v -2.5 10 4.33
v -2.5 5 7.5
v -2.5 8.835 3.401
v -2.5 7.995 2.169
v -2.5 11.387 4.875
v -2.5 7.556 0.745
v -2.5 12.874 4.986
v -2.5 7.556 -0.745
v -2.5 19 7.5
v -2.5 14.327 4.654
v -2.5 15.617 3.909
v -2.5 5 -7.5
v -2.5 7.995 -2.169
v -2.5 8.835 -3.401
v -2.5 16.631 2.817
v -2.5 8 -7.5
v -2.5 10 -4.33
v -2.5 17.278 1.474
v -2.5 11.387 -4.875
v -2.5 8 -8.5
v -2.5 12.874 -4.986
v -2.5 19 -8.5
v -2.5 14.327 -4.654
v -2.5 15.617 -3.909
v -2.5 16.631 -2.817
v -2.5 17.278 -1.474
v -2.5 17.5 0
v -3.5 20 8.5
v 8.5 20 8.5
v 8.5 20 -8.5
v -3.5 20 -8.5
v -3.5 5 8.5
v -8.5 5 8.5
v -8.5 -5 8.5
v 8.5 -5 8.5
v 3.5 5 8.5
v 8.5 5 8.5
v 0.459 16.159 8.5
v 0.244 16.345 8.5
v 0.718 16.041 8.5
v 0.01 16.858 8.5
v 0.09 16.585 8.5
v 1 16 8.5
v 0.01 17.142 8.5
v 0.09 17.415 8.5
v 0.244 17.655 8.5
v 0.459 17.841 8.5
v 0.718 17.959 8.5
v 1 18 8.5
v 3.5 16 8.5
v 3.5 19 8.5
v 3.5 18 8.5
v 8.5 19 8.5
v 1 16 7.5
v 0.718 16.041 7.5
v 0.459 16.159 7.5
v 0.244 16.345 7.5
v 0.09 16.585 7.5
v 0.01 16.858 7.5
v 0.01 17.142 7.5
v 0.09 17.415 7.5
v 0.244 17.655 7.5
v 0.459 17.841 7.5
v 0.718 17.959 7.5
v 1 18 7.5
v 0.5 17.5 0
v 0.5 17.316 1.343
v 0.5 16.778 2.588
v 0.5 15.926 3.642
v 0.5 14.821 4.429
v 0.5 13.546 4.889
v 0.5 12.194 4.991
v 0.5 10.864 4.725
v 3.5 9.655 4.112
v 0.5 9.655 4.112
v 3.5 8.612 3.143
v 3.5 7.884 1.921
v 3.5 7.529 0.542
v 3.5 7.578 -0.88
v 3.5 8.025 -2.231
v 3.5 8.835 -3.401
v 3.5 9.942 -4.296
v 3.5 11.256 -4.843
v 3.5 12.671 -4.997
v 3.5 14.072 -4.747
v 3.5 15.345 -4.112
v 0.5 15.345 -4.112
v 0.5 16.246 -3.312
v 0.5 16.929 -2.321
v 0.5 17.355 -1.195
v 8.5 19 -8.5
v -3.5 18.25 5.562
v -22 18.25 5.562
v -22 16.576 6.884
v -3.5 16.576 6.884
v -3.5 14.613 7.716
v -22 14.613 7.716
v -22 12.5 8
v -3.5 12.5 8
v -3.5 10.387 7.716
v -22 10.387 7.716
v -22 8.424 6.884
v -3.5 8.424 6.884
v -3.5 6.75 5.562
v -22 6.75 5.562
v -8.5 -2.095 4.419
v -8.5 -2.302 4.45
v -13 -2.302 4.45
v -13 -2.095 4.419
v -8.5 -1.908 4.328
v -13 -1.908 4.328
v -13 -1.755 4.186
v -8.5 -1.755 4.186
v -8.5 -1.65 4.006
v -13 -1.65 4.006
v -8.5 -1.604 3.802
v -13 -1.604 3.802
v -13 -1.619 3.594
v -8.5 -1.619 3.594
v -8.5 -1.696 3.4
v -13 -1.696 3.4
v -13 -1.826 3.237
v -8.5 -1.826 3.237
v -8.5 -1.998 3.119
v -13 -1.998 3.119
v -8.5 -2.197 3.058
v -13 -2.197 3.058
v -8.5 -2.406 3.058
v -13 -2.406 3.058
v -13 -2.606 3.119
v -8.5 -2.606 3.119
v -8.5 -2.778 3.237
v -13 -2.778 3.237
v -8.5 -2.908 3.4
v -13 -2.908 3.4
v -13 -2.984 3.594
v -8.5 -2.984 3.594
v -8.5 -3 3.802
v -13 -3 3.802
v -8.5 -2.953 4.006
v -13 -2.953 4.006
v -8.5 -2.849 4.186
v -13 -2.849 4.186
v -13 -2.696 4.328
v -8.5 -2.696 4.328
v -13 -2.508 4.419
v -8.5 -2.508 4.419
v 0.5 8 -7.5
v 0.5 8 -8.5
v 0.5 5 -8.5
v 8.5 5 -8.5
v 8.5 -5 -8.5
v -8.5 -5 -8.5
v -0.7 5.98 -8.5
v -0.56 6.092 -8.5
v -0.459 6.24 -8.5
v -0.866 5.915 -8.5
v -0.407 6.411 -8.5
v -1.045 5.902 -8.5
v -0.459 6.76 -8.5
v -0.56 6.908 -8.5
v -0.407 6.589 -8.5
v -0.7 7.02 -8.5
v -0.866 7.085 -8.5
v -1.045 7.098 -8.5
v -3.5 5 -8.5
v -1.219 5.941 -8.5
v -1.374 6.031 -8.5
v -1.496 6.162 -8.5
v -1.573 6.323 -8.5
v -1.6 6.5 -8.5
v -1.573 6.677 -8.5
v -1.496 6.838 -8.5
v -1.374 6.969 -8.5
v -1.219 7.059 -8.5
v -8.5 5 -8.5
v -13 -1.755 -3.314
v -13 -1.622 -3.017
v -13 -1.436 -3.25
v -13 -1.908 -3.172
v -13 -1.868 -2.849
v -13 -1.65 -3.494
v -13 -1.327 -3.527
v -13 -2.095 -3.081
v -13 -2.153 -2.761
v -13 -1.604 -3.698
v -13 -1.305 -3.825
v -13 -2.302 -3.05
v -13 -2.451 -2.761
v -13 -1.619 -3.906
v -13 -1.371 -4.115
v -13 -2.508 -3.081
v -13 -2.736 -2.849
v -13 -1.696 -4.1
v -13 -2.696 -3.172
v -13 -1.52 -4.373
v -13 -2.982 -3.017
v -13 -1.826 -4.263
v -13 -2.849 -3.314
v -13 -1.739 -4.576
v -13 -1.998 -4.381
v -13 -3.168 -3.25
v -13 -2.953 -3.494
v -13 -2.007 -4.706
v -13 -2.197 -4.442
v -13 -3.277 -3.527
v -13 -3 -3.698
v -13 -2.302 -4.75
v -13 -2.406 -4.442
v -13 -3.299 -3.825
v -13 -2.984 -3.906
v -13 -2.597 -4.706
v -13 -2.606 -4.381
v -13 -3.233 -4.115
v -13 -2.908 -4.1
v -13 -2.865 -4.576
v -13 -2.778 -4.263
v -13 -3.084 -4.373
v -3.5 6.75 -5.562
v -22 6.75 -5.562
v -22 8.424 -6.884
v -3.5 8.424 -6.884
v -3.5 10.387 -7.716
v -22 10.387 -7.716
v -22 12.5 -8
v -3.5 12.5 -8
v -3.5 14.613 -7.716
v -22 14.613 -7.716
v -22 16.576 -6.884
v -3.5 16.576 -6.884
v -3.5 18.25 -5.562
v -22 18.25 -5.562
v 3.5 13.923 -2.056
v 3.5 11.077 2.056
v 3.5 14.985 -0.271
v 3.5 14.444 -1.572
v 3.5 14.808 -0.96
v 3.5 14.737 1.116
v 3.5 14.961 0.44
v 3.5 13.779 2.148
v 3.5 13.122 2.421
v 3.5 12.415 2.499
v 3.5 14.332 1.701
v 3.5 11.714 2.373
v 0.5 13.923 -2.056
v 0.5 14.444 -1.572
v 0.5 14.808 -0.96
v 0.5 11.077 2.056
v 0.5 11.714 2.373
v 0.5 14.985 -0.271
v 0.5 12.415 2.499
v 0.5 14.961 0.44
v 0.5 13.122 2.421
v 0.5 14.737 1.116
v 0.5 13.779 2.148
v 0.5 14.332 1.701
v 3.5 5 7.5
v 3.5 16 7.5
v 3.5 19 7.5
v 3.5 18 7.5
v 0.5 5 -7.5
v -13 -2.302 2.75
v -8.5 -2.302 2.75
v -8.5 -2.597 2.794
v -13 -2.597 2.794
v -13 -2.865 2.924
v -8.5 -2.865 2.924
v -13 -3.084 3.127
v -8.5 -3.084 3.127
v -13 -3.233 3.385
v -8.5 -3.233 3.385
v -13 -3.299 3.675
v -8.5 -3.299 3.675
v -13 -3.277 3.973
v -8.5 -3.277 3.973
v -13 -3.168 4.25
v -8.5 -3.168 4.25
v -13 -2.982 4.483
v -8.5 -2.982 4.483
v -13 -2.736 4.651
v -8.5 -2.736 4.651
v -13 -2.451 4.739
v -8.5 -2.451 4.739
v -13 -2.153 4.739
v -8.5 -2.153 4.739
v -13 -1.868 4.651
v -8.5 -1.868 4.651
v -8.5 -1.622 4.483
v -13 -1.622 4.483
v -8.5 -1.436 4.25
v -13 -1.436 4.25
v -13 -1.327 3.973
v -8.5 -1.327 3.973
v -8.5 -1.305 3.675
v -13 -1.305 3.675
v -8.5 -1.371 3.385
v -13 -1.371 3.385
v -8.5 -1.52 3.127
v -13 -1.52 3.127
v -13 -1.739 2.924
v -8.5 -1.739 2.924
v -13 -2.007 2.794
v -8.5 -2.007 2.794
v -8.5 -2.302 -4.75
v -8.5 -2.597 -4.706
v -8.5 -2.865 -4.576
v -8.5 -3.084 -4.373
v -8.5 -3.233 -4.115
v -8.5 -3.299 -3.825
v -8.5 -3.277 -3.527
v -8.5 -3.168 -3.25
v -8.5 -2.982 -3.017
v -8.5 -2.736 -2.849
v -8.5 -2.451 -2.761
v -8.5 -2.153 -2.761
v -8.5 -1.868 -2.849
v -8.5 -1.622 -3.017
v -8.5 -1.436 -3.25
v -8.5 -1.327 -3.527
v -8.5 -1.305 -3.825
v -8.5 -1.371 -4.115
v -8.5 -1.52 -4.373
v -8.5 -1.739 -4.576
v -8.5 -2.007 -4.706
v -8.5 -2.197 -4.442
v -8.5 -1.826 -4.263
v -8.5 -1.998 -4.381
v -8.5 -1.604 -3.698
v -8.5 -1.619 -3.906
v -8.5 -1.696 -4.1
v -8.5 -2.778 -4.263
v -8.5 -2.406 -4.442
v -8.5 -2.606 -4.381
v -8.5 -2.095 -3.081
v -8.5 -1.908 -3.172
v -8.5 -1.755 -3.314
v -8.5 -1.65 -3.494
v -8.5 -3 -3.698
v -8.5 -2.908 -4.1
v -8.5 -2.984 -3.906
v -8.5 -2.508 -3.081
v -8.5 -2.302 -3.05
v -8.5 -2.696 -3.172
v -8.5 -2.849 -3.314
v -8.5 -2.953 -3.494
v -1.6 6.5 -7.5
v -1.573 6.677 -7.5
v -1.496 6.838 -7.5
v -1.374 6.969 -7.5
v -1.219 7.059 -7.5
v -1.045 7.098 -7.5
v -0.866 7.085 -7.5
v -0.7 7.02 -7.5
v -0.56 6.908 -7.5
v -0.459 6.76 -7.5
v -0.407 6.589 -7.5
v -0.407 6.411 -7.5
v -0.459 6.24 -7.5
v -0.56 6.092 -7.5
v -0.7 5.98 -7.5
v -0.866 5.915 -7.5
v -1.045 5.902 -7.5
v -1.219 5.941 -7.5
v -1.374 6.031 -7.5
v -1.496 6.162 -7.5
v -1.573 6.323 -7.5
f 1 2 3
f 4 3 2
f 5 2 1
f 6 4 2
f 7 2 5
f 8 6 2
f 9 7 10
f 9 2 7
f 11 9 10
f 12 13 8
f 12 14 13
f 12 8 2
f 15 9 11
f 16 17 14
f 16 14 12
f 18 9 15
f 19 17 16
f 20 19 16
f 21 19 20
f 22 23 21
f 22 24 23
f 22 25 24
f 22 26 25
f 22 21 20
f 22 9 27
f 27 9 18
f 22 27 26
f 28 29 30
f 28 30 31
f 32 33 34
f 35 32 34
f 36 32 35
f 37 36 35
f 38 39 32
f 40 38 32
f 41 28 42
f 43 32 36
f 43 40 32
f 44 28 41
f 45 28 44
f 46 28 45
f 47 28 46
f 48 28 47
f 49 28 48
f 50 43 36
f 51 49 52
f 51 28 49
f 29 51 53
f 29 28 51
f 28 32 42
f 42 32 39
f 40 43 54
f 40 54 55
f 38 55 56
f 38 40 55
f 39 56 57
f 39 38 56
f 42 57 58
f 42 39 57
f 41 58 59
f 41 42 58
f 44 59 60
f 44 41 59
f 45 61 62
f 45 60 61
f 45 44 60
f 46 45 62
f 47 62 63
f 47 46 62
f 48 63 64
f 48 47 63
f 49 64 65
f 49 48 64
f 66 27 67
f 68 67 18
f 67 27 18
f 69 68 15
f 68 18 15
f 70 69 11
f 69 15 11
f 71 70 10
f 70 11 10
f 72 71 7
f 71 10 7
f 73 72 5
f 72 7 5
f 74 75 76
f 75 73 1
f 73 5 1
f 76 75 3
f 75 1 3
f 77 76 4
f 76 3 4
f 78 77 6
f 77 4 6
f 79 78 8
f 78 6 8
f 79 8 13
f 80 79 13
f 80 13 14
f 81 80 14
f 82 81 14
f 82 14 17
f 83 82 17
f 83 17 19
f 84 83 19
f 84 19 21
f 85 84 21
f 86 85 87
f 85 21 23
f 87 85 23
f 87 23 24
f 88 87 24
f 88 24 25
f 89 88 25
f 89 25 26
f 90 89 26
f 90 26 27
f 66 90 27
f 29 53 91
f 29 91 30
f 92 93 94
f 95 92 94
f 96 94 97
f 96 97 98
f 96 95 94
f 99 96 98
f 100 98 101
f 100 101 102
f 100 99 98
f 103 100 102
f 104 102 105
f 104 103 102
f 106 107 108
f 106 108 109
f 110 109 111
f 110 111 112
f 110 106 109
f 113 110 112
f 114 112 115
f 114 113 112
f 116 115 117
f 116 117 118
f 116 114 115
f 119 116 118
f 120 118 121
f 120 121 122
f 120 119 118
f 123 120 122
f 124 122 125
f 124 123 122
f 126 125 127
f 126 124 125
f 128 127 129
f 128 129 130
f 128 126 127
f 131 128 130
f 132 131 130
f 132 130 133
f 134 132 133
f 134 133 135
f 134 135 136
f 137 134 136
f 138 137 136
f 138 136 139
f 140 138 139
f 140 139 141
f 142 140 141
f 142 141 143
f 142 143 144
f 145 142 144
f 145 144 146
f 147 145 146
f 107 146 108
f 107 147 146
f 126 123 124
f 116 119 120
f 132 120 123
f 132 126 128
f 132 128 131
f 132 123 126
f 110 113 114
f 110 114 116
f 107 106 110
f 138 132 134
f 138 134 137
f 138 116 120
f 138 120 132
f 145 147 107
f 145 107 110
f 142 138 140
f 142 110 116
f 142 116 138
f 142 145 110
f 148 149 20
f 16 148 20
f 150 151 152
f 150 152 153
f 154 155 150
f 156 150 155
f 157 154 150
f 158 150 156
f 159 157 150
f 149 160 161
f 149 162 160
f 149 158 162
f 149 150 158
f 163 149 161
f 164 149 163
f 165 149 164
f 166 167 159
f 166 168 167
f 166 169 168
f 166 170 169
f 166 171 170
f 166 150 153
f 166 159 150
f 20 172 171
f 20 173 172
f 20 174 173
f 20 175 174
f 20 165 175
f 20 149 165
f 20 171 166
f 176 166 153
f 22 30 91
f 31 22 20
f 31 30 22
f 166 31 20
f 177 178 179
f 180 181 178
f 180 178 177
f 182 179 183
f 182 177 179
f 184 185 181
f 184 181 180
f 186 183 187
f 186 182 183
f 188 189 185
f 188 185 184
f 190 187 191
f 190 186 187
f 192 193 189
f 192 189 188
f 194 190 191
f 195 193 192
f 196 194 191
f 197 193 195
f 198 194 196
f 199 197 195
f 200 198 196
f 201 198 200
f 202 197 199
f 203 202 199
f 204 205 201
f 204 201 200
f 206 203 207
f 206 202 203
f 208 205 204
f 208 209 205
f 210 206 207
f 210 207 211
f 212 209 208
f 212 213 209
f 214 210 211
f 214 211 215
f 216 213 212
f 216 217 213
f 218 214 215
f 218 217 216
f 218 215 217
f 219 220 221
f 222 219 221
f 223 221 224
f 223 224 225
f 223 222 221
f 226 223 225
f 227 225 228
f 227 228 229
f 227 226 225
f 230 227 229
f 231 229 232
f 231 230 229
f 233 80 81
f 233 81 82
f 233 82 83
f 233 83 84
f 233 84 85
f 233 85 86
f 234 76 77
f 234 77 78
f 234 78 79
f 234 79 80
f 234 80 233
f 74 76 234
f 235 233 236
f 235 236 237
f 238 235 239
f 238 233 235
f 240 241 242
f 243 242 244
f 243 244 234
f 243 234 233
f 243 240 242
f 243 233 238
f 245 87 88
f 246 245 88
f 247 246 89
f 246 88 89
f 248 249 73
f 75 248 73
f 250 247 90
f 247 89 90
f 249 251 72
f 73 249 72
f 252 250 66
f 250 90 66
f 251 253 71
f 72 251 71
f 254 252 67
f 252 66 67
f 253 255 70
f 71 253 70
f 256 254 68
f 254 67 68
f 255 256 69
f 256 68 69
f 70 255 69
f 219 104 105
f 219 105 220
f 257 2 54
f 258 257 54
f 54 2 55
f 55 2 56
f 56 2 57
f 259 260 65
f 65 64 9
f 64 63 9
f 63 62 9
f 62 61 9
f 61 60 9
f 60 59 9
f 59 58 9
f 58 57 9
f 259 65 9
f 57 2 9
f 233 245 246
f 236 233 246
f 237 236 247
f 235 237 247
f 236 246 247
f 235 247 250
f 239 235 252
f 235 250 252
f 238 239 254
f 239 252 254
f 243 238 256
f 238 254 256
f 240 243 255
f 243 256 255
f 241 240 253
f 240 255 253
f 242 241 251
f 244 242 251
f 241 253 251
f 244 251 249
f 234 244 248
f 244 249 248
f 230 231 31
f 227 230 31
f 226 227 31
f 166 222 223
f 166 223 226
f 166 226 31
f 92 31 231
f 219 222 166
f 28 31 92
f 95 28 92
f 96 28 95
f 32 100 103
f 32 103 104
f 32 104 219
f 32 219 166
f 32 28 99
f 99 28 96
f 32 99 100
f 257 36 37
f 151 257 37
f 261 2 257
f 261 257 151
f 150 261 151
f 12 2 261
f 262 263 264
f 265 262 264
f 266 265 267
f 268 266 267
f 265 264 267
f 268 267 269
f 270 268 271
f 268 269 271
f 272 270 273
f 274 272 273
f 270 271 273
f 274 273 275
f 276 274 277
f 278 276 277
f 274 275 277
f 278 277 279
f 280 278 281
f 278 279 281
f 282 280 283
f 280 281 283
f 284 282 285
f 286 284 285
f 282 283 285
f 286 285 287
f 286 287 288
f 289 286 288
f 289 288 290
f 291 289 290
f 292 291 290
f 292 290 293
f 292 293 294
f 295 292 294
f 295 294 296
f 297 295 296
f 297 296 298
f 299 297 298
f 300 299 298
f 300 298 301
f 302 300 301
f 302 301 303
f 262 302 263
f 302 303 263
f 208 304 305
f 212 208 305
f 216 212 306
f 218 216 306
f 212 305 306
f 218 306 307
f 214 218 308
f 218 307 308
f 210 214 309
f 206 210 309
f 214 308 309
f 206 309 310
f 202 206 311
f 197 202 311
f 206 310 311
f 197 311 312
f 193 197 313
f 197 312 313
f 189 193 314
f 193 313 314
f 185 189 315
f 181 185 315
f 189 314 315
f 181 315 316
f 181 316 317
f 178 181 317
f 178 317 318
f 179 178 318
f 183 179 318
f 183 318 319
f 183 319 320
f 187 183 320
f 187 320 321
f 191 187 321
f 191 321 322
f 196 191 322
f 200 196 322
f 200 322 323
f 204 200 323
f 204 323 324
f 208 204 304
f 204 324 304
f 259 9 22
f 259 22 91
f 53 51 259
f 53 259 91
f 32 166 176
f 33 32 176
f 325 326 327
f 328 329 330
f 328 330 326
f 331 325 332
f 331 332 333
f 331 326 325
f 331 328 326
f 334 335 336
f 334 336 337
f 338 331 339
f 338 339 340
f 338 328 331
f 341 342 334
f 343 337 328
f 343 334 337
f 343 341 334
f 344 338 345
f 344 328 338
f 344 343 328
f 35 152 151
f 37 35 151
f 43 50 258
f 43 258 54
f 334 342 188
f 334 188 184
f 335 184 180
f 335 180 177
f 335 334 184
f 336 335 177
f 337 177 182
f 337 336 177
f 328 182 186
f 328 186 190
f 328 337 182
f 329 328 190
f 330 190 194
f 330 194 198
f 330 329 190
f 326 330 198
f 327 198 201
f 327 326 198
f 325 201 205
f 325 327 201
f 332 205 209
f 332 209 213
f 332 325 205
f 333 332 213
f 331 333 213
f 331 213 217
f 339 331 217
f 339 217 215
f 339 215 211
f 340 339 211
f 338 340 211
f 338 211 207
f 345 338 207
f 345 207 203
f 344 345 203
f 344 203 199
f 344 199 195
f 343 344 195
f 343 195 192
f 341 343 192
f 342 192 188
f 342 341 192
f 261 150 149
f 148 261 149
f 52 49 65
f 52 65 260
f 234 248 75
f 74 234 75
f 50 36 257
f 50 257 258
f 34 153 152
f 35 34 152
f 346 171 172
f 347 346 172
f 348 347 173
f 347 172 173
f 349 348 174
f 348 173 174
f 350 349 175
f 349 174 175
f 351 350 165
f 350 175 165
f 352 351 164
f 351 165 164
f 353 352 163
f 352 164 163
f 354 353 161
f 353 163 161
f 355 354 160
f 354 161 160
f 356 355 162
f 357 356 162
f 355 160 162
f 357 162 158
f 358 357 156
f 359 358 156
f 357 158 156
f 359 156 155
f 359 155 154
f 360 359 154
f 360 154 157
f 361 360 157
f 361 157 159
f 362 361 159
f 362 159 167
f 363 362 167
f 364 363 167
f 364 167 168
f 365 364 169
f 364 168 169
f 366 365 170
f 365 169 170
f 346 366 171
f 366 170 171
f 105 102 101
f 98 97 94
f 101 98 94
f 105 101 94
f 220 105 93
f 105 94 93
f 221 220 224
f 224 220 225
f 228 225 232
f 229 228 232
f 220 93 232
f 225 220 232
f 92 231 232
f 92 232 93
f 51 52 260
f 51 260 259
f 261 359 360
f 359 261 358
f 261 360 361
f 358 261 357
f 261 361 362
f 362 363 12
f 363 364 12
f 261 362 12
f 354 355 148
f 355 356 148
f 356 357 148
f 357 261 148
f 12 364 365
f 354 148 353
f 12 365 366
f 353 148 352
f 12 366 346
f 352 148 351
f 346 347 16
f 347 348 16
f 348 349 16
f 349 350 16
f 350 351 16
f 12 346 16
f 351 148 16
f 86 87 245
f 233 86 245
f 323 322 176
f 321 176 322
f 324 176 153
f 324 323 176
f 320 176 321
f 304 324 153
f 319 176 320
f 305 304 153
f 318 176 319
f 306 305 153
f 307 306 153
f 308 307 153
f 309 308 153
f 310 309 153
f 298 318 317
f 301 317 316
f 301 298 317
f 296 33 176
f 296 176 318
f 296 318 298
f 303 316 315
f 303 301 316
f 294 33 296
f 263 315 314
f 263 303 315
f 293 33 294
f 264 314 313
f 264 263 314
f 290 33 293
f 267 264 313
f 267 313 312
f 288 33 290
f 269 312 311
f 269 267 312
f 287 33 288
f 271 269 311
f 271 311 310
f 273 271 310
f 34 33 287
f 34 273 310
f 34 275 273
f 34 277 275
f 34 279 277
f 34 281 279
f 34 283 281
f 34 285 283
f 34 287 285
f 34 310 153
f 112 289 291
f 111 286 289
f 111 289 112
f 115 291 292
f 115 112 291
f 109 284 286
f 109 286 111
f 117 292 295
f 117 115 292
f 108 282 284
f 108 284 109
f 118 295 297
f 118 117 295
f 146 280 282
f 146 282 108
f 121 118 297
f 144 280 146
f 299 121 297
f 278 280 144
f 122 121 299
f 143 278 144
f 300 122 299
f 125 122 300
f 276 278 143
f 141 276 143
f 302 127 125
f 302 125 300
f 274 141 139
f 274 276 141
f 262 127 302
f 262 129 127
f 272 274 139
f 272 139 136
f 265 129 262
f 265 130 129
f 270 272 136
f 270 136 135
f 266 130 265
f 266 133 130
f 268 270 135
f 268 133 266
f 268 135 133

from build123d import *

# Parameters (mm, degrees)
BOSS_EXTRUDE1_DEPTH     = 8.5
CUT_EXTRUDE1_DEPTH      = 24.334523779
CUT_EXTRUDE1_DEPTH_BACK = 2.5
SKETCH2_W               = 16
SKETCH2_H               = 14
SKETCH3_W               = 3
SKETCH3_H               = 3
SKETCH3_R               = 0.6
BOSS_EXTRUDE2_DEPTH     = 1
BOSS_EXTRUDE3_DEPTH     = 18.5
SKETCH5_R               = 5
BOSS_EXTRUDE4_DEPTH     = 6
CUT_EXTRUDE2_START      = -3
CUT_EXTRUDE2_DEPTH      = 3
SKETCH7_R               = 1
SKETCH7_R_2             = 0.7
BOSS_EXTRUDE5_DEPTH     = 4.5


with BuildPart() as part:
    # Sketch1 → Boss-Extrude1 (new, symmetric)
    with BuildSketch(Plane.XY):
        with BuildLine():
            Line((-8.5, 5), (-8.5, -5))
            Line((-8.5, -5), (8.5, -5))
            Line((8.5, -5), (8.5, 5))
            Line((8.5, 5), (3.5, 5))
            Line((3.5, 5), (3.5, 16))
            Line((3.5, 16), (1, 16))
            ThreePointArc((1, 16), (0, 17), (1, 18))
            Line((1, 18), (3.5, 18))
            Line((3.5, 18), (3.5, 19))
            Line((3.5, 19), (8.5, 19))
            Line((8.5, 19), (8.5, 20))
            Line((8.5, 20), (-3.5, 20))
            Line((-3.5, 20), (-3.5, 5))
            Line((-3.5, 5), (-8.5, 5))
        make_face()
    extrude(amount=BOSS_EXTRUDE1_DEPTH, both=True)

    # Sketch2 → Cut-Extrude1 (cut, two sides: drawn at the far end of the back side and taken through both)
    with BuildSketch(Plane(origin=(0, 0, 0), x_dir=(0, 0, -1), z_dir=(1, 0, 0)).offset(-CUT_EXTRUDE1_DEPTH_BACK)):
        with Locations((0.5, 12)):
            Rectangle(SKETCH2_W, SKETCH2_H)
    extrude(amount=CUT_EXTRUDE1_DEPTH + CUT_EXTRUDE1_DEPTH_BACK, mode=Mode.SUBTRACT)

    # Sketch3 → Boss-Extrude2 (add)
    with BuildSketch(Plane(origin=(0, 0, -8.5), x_dir=(-1, 0, 0), z_dir=(0, 0, -1))):
        with Locations((1, 6.5)):
            Rectangle(SKETCH3_W, SKETCH3_H)
        with Locations((1, 6.5)):
            Circle(SKETCH3_R, mode=Mode.SUBTRACT)
    extrude(amount=-BOSS_EXTRUDE2_DEPTH)

    # Sketch4 → Boss-Extrude3 (add)
    with BuildSketch(Plane.ZY.offset(3.5)):
        with BuildLine():
            Line((-5.562148865, 18.25), (5.562148865, 18.25))
            ThreePointArc((5.562148865, 18.25), (8, 12.5), (5.562148865, 6.75))
            Line((5.562148865, 6.75), (-5.562148865, 6.75))
            ThreePointArc((-5.562148865, 6.75), (-8, 12.5), (-5.562148865, 18.25))
        make_face()
    extrude(amount=BOSS_EXTRUDE3_DEPTH)

    # Sketch5 → Boss-Extrude4 (add)
    with BuildSketch(Plane(origin=(-2.5, 0, 0), x_dir=(0, 0, -1), z_dir=(1, 0, 0))):
        with Locations(Location((0, 12.5, 0), (0, 0, 90))):
            Circle(SKETCH5_R)
    extrude(amount=BOSS_EXTRUDE4_DEPTH)

    # Sketch6 → Cut-Extrude2 (cut)
    with BuildSketch(Plane(origin=(3.5, 0, 0), x_dir=(0, 0, -1), z_dir=(1, 0, 0)).offset(CUT_EXTRUDE2_START)):
        with BuildLine():
            Line((4.111517555, 15.345245752), (2.055758778, 13.922622876))
            ThreePointArc((2.055758778, 13.922622876), (-1.422622876, 14.555758778), (-2.055758778, 11.077377124))
            Line((-2.055758778, 11.077377124), (-4.111517555, 9.654754248))
            ThreePointArc((-4.111517555, 9.654754248), (-2.845245752, 16.611517555), (4.111517555, 15.345245752))
        make_face()
    extrude(amount=CUT_EXTRUDE2_DEPTH, mode=Mode.SUBTRACT)

    # Sketch7 → Boss-Extrude5 (add)
    # profile 1 of 2: a face of its own
    with BuildSketch(Plane.ZY.offset(8.5)):
        with Locations(Location((-3.75, -2.301826995, 0), (0, 0, 180))):
            Circle(SKETCH7_R)
        with Locations((-3.75, -2.301826995)):
            Circle(SKETCH7_R_2, mode=Mode.SUBTRACT)
    # profile 2 of 2: a face of its own
    with BuildSketch(Plane.ZY.offset(8.5)):
        with Locations(Location((3.75, -2.301826995, 0), (0, 0, 180))):
            Circle(SKETCH7_R)
        with Locations((3.75, -2.301826995)):
            Circle(SKETCH7_R_2, mode=Mode.SUBTRACT)
    extrude(amount=BOSS_EXTRUDE5_DEPTH)


solid = part.part
